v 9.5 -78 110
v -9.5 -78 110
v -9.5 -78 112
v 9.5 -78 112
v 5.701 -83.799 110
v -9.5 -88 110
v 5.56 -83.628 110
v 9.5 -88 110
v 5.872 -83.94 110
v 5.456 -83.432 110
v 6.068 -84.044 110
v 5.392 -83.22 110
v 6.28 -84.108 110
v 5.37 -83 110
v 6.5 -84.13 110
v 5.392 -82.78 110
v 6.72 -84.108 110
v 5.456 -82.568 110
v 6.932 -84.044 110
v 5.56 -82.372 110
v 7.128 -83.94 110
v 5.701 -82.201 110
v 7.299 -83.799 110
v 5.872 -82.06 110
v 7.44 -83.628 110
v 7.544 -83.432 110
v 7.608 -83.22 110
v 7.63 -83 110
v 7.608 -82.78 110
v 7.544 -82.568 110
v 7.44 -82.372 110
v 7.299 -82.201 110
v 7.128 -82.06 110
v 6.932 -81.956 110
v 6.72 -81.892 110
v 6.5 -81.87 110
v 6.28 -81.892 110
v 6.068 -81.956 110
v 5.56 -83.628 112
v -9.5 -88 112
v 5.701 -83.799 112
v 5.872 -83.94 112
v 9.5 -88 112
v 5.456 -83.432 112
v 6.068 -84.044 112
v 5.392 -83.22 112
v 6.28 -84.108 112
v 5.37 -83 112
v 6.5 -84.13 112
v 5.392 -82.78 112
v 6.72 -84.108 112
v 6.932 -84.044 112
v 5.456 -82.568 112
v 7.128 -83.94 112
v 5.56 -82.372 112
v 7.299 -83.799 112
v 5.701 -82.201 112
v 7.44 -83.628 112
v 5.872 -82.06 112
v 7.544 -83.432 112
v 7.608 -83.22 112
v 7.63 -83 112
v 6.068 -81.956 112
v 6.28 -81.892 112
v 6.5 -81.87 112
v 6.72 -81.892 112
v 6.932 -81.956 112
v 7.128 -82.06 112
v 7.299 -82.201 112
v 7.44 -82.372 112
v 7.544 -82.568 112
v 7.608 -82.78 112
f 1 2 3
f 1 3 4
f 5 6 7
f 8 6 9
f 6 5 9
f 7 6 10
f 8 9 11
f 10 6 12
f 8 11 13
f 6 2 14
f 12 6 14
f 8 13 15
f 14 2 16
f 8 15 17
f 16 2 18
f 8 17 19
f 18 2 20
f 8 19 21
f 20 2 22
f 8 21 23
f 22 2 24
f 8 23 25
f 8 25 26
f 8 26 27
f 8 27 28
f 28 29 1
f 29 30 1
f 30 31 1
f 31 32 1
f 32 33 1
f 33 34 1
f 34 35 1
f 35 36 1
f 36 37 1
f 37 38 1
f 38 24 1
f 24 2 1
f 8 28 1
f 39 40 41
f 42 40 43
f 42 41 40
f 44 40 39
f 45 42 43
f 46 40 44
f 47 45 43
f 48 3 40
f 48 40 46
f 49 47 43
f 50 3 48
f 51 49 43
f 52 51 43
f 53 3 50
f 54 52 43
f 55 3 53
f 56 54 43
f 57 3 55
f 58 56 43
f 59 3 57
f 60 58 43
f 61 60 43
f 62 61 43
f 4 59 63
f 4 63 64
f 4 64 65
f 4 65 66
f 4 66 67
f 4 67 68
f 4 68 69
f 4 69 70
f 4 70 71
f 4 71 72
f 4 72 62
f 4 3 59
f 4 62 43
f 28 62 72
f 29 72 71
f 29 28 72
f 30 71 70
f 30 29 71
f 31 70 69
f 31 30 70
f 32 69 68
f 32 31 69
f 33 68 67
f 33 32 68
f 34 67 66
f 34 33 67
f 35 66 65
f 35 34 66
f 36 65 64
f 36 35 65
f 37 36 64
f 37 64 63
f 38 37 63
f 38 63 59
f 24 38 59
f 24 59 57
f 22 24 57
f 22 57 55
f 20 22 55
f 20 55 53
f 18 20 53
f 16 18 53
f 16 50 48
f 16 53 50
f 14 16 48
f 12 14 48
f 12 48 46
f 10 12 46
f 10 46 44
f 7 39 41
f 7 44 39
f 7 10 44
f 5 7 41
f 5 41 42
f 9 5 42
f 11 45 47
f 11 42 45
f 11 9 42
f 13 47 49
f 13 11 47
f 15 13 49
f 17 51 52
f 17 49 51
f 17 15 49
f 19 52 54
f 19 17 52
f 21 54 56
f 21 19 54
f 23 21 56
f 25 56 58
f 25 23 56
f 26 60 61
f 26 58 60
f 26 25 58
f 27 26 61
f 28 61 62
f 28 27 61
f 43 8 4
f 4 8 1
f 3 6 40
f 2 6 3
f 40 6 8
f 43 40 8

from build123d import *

# Parameters (mm, degrees)
CYLINDER098_R     = 1.13
CYLINDER098_DEPTH = 10
BOX_W             = 19
BOX_H             = 10
BOX_DEPTH         = 2


with BuildPart() as cylinder098:
    # Cylinder098 → Cylinder098 (new body)
    with BuildSketch(Plane(origin=(6.5, -83, 0), x_dir=(1, 0, 0), z_dir=(0, 0, 1))):
        Circle(CYLINDER098_R)
    extrude(amount=CYLINDER098_DEPTH)


with BuildPart() as guva001:
    # Box → Box (new body)
    with BuildSketch(Plane(origin=(-9.5, -88, 0), x_dir=(1, 0, 0), z_dir=(0, 0, 1))):
        with Locations((9.5, 5)):
            Rectangle(BOX_W, BOX_H)
    extrude(amount=BOX_DEPTH)

    # Cut018: cut Cylinder098
    add(cylinder098.part, mode=Mode.SUBTRACT)


with BuildPart() as guva001_1:
    # Cut018 placement: moved
    add(guva001.part.moved(Location((0, 0, 110))))


solid = guva001_1.part
